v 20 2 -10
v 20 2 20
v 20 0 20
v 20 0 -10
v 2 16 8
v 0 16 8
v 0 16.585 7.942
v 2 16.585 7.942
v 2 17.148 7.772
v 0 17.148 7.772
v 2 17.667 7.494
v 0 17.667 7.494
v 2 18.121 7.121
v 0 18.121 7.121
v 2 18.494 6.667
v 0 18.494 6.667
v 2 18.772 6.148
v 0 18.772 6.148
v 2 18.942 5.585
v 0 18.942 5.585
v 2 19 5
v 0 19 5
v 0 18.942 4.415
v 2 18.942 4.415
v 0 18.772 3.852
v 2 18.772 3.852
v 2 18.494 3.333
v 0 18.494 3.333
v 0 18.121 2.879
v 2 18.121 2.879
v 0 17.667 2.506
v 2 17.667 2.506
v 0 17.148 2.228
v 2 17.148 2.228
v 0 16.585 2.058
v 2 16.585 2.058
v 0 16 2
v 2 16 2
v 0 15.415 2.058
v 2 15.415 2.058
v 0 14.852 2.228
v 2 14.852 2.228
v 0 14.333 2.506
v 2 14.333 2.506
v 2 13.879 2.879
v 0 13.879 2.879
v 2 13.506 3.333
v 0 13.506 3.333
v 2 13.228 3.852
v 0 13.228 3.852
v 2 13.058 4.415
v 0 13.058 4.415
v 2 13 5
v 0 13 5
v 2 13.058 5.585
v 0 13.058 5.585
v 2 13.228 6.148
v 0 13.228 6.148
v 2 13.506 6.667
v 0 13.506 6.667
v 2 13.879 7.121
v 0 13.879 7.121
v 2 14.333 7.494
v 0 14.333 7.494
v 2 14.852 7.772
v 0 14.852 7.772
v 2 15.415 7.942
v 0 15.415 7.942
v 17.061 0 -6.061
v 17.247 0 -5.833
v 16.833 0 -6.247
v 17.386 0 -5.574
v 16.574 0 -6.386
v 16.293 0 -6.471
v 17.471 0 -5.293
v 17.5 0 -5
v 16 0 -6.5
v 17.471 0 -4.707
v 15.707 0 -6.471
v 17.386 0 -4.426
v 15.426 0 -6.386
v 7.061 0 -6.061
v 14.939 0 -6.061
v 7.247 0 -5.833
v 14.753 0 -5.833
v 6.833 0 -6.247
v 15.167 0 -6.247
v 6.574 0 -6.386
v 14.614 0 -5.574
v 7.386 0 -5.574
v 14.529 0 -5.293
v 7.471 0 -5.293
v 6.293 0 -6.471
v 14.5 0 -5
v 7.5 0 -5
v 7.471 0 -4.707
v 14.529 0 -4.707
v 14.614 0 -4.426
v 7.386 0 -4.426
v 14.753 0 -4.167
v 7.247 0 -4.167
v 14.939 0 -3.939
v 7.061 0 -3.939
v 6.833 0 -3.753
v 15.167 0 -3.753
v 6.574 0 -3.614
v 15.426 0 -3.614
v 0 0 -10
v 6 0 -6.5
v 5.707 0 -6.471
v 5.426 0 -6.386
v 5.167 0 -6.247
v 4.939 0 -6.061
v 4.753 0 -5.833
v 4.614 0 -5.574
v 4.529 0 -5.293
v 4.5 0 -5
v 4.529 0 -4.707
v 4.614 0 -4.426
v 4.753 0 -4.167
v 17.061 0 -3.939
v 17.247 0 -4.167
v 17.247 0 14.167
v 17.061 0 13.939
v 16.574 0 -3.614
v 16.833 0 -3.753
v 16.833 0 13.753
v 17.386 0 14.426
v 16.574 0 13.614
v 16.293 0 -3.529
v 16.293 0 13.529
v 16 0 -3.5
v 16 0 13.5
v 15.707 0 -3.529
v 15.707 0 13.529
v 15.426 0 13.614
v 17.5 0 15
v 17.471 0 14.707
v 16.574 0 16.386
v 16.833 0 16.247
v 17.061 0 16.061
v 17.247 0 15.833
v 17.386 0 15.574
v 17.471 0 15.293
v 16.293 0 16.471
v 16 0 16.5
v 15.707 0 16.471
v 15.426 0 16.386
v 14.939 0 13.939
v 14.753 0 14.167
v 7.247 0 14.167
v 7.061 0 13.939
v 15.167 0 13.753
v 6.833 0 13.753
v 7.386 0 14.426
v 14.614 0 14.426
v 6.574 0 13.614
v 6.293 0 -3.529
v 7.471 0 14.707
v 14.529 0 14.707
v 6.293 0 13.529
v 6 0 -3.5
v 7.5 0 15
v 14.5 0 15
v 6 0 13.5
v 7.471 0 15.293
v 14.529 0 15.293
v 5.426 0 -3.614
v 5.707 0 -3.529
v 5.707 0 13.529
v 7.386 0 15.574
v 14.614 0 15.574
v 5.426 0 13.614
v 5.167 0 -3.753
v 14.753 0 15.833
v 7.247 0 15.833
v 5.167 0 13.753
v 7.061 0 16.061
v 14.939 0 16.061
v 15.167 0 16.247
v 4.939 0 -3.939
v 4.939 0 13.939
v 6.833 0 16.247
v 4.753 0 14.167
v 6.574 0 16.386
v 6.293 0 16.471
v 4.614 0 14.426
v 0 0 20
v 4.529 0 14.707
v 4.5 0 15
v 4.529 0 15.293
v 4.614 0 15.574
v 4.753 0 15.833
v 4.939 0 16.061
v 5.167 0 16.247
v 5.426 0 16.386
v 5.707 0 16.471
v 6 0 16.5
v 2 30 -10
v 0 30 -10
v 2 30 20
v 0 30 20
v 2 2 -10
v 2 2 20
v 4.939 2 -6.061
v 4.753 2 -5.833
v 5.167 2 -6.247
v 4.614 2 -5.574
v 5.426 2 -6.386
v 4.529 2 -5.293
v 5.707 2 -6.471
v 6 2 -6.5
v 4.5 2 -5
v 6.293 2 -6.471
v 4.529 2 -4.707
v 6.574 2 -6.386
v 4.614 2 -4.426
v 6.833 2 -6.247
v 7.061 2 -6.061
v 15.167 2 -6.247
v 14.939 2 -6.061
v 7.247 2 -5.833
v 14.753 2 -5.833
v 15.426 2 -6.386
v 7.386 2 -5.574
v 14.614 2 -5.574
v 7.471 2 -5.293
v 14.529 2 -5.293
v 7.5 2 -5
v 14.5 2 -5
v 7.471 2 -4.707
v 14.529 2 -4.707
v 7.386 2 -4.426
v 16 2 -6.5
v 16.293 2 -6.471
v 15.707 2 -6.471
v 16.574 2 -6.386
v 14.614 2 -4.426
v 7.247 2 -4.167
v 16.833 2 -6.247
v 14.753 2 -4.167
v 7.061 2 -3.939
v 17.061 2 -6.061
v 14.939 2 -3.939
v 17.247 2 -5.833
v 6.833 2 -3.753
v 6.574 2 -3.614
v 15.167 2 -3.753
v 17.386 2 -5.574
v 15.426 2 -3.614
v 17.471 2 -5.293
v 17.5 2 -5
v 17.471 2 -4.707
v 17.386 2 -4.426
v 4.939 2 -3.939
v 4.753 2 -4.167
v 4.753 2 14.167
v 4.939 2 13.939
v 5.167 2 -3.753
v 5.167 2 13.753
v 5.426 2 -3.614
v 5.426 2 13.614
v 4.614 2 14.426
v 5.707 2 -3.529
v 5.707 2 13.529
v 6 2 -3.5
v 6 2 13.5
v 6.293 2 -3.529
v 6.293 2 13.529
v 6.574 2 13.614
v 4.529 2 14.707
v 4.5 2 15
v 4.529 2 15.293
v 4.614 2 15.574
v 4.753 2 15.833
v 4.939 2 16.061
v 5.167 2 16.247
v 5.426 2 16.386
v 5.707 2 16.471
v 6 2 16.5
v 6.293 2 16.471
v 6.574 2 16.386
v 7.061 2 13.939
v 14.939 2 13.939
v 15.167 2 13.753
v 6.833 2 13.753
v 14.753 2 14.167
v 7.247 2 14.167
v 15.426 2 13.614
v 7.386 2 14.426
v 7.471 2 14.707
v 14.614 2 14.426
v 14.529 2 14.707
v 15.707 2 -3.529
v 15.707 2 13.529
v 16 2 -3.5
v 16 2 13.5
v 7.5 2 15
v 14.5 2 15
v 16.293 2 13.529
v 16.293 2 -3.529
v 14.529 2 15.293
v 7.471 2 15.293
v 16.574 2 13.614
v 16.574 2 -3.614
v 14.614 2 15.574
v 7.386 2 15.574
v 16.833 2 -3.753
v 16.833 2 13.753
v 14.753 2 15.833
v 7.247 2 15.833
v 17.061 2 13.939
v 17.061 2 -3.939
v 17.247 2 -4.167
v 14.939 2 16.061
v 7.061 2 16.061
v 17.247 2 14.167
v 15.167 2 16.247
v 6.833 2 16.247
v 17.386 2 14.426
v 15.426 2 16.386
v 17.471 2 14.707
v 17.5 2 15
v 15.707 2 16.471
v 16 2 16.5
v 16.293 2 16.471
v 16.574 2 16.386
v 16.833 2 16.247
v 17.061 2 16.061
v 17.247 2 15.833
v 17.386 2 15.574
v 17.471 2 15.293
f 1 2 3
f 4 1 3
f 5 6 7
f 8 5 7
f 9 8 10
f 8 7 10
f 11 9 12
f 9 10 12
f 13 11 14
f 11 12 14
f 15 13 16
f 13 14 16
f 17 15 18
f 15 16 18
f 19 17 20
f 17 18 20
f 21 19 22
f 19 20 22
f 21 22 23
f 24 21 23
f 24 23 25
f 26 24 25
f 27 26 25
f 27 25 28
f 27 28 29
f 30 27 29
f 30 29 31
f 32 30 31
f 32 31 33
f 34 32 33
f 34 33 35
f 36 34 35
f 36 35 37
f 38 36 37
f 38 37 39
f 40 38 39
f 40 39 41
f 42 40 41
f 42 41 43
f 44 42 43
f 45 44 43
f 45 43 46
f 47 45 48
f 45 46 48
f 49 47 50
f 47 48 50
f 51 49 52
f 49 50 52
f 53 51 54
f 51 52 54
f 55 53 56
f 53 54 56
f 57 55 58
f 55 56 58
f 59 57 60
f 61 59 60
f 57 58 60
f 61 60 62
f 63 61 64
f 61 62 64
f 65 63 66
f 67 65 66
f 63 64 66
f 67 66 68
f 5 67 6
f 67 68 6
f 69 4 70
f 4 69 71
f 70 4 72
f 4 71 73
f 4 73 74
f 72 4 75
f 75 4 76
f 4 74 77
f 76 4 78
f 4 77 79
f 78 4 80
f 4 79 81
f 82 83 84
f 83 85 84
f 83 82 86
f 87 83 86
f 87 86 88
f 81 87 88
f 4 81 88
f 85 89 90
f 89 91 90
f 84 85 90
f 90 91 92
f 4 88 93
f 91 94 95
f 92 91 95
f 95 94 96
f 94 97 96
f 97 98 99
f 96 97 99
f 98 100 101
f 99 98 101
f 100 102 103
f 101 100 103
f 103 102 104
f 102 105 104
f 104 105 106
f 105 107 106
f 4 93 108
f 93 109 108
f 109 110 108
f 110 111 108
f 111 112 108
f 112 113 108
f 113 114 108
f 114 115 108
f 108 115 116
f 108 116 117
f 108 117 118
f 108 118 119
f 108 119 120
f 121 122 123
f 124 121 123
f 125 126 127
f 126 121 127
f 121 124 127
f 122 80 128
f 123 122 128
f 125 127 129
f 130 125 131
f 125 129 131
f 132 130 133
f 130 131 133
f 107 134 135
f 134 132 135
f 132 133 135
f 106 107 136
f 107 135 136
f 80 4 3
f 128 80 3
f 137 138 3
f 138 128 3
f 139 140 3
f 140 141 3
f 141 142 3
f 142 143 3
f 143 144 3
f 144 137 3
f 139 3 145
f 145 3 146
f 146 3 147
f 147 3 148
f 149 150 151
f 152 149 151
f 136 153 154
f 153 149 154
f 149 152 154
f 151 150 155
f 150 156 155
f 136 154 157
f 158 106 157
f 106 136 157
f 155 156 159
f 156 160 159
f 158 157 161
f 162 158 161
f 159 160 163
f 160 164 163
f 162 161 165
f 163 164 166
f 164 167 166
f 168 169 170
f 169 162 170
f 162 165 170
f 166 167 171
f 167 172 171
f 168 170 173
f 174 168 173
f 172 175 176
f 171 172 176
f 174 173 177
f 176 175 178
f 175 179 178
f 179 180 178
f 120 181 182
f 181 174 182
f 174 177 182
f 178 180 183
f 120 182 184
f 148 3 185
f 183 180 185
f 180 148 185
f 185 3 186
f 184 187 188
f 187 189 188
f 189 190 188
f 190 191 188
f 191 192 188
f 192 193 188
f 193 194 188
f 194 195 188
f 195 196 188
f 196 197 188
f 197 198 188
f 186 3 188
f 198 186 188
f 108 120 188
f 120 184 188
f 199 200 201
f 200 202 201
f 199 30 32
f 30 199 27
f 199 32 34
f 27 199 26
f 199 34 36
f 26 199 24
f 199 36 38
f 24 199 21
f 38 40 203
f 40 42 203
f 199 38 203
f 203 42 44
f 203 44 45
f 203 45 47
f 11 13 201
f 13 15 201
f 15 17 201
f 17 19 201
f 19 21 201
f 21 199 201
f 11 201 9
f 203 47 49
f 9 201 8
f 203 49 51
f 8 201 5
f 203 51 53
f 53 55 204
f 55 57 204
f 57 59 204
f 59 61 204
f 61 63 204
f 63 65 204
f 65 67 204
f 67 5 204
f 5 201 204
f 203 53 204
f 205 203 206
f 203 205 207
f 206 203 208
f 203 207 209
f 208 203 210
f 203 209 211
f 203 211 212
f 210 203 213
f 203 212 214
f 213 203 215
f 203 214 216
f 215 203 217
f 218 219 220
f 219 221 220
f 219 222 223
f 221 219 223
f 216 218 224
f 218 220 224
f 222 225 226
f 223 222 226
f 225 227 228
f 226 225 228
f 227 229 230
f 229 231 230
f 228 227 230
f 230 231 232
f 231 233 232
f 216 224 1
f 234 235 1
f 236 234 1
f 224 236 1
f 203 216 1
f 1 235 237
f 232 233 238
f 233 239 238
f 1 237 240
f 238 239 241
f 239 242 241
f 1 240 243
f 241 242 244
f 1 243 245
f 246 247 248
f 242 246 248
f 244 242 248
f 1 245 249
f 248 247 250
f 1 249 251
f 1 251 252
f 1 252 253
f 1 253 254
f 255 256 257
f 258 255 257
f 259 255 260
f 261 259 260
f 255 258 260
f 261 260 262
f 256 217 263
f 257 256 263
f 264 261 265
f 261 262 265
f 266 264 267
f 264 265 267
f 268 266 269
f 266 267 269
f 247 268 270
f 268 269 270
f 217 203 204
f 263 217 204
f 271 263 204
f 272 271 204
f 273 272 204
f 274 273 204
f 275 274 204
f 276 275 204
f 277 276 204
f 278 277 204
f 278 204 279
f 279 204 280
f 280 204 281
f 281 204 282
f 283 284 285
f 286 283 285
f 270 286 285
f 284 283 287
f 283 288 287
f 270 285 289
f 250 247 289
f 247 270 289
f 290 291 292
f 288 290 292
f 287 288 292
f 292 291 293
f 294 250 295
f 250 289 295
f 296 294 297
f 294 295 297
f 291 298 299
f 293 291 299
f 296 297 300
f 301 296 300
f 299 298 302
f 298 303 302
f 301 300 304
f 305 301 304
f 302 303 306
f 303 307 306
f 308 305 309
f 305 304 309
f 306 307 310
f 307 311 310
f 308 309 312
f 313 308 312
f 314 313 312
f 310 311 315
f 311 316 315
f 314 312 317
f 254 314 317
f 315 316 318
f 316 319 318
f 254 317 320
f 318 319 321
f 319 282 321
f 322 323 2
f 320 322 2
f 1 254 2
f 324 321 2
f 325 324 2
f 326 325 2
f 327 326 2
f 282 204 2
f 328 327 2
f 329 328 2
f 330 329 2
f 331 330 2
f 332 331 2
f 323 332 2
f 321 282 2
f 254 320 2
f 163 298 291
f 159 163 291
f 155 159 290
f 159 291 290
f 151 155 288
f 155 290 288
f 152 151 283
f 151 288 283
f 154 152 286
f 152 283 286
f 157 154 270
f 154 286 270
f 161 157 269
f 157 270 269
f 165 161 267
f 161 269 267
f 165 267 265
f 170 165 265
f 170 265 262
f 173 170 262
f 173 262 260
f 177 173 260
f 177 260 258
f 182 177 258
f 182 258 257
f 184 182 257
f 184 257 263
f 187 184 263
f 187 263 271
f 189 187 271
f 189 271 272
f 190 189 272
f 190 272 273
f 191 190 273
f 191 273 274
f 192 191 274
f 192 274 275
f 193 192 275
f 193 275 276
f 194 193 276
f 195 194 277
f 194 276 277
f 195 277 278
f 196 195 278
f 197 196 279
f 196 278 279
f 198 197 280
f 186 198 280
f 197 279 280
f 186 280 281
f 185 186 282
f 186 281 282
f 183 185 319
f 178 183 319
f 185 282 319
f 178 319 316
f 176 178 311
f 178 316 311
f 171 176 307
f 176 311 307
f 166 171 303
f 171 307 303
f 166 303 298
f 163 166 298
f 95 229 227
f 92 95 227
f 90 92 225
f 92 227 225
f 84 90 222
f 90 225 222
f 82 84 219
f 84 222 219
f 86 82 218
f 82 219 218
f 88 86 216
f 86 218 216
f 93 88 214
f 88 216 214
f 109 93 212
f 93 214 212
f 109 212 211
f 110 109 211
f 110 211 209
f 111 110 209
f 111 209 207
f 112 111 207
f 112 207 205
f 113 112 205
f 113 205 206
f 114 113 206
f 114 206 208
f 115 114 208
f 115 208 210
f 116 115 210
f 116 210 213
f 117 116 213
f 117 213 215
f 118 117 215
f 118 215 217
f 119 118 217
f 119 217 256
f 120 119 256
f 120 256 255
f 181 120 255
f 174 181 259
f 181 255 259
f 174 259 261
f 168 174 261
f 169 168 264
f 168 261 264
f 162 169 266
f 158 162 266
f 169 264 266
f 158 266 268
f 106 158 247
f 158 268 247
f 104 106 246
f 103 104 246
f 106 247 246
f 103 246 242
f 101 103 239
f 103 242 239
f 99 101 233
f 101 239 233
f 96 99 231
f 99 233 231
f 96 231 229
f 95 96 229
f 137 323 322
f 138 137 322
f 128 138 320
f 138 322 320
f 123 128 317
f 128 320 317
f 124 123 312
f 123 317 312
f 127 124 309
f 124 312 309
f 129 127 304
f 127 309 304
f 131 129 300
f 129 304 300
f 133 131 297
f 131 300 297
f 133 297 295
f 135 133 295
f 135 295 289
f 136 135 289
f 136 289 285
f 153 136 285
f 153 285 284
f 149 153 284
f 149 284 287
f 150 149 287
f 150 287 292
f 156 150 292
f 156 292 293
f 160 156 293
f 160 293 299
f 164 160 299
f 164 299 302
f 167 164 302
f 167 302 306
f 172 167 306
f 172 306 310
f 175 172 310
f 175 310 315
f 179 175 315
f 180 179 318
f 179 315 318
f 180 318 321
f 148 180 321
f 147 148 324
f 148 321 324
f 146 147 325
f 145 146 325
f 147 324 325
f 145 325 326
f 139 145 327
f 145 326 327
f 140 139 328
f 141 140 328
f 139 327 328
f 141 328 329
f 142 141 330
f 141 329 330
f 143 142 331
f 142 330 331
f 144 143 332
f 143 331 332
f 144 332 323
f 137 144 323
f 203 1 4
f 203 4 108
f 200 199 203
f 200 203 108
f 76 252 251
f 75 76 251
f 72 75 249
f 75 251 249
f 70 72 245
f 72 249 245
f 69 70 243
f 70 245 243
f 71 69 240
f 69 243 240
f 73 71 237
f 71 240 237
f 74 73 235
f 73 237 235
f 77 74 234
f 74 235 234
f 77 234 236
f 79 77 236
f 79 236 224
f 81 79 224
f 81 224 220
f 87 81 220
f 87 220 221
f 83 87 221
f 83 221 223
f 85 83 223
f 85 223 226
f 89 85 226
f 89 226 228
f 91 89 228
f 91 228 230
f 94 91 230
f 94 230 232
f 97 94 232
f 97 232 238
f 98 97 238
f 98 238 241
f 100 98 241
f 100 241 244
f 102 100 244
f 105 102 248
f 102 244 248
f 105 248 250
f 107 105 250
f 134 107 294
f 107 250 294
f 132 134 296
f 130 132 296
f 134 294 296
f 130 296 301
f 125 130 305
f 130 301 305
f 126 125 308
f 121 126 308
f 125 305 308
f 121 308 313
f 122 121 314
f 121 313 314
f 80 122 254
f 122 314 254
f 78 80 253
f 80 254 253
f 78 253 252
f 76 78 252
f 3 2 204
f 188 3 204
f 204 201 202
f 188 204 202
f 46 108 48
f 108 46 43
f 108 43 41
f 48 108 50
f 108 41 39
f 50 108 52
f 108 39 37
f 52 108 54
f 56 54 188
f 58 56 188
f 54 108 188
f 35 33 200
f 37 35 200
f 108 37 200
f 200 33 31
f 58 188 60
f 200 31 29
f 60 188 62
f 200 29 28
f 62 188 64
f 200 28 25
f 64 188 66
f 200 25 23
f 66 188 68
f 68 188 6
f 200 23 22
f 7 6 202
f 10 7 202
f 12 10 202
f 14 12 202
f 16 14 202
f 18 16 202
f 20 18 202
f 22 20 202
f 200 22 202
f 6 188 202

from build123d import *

# Parameters (mm, degrees)
EXTRUDE_1_DEPTH     = 20
SKETCH_2_R          = 3
CUT_EXTRUDE_1_DEPTH = 39
SKETCH_4_W          = 3
SKETCH_4_H          = 20
CUT_EXTRUDE_3_DEPTH = 8
SKETCH_5_W          = 35
SKETCH_5_H          = 20
CUT_EXTRUDE_4_DEPTH = 1
SKETCH_6_W          = 20
SKETCH_6_H          = 28
CUT_EXTRUDE_5_DEPTH = 1
SKETCH_8_W          = 20
SKETCH_8_H          = 2
CUT_EXTRUDE_6_DEPTH = 18
EXTRUDE_2_DEPTH     = 10
SKETCH_10_R         = 1.5
CUT_EXTRUDE_7_DEPTH = 10


with BuildPart() as part:
    # 草图1 → 凸台-拉伸1 (new body)
    with BuildSketch(Plane.XY):
        Polygon((0, 0), (0, 38), (3, 38), (3, 3), (38, 3), (38, 0), align=None)
    extrude(amount=EXTRUDE_1_DEPTH)

    # 草图2 → 切除-拉伸1 (cut, through all)
    with BuildSketch(Plane.ZY):
        with Locations((5, 16)):
            Circle(SKETCH_2_R)
    extrude(amount=-CUT_EXTRUDE_1_DEPTH, mode=Mode.SUBTRACT)

    # 草图4 → 切除-拉伸3 (cut)
    with BuildSketch(Plane(origin=(0, 38, 0), x_dir=(1, 0, 0), z_dir=(0, 1, 0))):
        with Locations((1.5, -10)):
            Rectangle(SKETCH_4_W, SKETCH_4_H)
    extrude(amount=-CUT_EXTRUDE_3_DEPTH, mode=Mode.SUBTRACT)

    # 草图5 → 切除-拉伸4 (cut)
    with BuildSketch(Plane(origin=(0, 3, 0), x_dir=(1, 0, 0), z_dir=(0, 1, 0))):
        with Locations((20.5, -10)):
            Rectangle(SKETCH_5_W, SKETCH_5_H)
    extrude(amount=-CUT_EXTRUDE_4_DEPTH, mode=Mode.SUBTRACT)

    # 草图6 → 切除-拉伸5 (cut)
    with BuildSketch(Plane(origin=(3, 0, 0), x_dir=(0, 0, -1), z_dir=(1, 0, 0))):
        with Locations((-10, 16)):
            Rectangle(SKETCH_6_W, SKETCH_6_H)
    extrude(amount=-CUT_EXTRUDE_5_DEPTH, mode=Mode.SUBTRACT)

    # 草图8 → 切除-拉伸6 (cut)
    with BuildSketch(Plane(origin=(38, 0, 0), x_dir=(0, 0, -1), z_dir=(1, 0, 0))):
        with Locations((-10, 1)):
            Rectangle(SKETCH_8_W, SKETCH_8_H)
    extrude(amount=-CUT_EXTRUDE_6_DEPTH, mode=Mode.SUBTRACT)

    # 草图9 → 凸台-拉伸2 (add)
    with BuildSketch(Plane(origin=(0, 0, 0), x_dir=(-1, 0, 0), z_dir=(0, 0, -1))):
        Polygon((0, 0), (0, 30), (-2, 30), (-2, 2), (-20, 2), (-20, 0), align=None)
    extrude(amount=EXTRUDE_2_DEPTH)

    # 草图10 → 切除-拉伸7 (cut)
    with BuildSketch(Plane(origin=(0, 2, 0), x_dir=(1, 0, 0), z_dir=(0, 1, 0))):
        with Locations((16, -15)):
            Circle(SKETCH_10_R)
        with Locations((16, 5)):
            Circle(SKETCH_10_R)
        with Locations((6, -15)):
            Circle(SKETCH_10_R)
        with Locations((6, 5)):
            Circle(SKETCH_10_R)
    extrude(amount=-CUT_EXTRUDE_7_DEPTH, mode=Mode.SUBTRACT)


solid = part.part
